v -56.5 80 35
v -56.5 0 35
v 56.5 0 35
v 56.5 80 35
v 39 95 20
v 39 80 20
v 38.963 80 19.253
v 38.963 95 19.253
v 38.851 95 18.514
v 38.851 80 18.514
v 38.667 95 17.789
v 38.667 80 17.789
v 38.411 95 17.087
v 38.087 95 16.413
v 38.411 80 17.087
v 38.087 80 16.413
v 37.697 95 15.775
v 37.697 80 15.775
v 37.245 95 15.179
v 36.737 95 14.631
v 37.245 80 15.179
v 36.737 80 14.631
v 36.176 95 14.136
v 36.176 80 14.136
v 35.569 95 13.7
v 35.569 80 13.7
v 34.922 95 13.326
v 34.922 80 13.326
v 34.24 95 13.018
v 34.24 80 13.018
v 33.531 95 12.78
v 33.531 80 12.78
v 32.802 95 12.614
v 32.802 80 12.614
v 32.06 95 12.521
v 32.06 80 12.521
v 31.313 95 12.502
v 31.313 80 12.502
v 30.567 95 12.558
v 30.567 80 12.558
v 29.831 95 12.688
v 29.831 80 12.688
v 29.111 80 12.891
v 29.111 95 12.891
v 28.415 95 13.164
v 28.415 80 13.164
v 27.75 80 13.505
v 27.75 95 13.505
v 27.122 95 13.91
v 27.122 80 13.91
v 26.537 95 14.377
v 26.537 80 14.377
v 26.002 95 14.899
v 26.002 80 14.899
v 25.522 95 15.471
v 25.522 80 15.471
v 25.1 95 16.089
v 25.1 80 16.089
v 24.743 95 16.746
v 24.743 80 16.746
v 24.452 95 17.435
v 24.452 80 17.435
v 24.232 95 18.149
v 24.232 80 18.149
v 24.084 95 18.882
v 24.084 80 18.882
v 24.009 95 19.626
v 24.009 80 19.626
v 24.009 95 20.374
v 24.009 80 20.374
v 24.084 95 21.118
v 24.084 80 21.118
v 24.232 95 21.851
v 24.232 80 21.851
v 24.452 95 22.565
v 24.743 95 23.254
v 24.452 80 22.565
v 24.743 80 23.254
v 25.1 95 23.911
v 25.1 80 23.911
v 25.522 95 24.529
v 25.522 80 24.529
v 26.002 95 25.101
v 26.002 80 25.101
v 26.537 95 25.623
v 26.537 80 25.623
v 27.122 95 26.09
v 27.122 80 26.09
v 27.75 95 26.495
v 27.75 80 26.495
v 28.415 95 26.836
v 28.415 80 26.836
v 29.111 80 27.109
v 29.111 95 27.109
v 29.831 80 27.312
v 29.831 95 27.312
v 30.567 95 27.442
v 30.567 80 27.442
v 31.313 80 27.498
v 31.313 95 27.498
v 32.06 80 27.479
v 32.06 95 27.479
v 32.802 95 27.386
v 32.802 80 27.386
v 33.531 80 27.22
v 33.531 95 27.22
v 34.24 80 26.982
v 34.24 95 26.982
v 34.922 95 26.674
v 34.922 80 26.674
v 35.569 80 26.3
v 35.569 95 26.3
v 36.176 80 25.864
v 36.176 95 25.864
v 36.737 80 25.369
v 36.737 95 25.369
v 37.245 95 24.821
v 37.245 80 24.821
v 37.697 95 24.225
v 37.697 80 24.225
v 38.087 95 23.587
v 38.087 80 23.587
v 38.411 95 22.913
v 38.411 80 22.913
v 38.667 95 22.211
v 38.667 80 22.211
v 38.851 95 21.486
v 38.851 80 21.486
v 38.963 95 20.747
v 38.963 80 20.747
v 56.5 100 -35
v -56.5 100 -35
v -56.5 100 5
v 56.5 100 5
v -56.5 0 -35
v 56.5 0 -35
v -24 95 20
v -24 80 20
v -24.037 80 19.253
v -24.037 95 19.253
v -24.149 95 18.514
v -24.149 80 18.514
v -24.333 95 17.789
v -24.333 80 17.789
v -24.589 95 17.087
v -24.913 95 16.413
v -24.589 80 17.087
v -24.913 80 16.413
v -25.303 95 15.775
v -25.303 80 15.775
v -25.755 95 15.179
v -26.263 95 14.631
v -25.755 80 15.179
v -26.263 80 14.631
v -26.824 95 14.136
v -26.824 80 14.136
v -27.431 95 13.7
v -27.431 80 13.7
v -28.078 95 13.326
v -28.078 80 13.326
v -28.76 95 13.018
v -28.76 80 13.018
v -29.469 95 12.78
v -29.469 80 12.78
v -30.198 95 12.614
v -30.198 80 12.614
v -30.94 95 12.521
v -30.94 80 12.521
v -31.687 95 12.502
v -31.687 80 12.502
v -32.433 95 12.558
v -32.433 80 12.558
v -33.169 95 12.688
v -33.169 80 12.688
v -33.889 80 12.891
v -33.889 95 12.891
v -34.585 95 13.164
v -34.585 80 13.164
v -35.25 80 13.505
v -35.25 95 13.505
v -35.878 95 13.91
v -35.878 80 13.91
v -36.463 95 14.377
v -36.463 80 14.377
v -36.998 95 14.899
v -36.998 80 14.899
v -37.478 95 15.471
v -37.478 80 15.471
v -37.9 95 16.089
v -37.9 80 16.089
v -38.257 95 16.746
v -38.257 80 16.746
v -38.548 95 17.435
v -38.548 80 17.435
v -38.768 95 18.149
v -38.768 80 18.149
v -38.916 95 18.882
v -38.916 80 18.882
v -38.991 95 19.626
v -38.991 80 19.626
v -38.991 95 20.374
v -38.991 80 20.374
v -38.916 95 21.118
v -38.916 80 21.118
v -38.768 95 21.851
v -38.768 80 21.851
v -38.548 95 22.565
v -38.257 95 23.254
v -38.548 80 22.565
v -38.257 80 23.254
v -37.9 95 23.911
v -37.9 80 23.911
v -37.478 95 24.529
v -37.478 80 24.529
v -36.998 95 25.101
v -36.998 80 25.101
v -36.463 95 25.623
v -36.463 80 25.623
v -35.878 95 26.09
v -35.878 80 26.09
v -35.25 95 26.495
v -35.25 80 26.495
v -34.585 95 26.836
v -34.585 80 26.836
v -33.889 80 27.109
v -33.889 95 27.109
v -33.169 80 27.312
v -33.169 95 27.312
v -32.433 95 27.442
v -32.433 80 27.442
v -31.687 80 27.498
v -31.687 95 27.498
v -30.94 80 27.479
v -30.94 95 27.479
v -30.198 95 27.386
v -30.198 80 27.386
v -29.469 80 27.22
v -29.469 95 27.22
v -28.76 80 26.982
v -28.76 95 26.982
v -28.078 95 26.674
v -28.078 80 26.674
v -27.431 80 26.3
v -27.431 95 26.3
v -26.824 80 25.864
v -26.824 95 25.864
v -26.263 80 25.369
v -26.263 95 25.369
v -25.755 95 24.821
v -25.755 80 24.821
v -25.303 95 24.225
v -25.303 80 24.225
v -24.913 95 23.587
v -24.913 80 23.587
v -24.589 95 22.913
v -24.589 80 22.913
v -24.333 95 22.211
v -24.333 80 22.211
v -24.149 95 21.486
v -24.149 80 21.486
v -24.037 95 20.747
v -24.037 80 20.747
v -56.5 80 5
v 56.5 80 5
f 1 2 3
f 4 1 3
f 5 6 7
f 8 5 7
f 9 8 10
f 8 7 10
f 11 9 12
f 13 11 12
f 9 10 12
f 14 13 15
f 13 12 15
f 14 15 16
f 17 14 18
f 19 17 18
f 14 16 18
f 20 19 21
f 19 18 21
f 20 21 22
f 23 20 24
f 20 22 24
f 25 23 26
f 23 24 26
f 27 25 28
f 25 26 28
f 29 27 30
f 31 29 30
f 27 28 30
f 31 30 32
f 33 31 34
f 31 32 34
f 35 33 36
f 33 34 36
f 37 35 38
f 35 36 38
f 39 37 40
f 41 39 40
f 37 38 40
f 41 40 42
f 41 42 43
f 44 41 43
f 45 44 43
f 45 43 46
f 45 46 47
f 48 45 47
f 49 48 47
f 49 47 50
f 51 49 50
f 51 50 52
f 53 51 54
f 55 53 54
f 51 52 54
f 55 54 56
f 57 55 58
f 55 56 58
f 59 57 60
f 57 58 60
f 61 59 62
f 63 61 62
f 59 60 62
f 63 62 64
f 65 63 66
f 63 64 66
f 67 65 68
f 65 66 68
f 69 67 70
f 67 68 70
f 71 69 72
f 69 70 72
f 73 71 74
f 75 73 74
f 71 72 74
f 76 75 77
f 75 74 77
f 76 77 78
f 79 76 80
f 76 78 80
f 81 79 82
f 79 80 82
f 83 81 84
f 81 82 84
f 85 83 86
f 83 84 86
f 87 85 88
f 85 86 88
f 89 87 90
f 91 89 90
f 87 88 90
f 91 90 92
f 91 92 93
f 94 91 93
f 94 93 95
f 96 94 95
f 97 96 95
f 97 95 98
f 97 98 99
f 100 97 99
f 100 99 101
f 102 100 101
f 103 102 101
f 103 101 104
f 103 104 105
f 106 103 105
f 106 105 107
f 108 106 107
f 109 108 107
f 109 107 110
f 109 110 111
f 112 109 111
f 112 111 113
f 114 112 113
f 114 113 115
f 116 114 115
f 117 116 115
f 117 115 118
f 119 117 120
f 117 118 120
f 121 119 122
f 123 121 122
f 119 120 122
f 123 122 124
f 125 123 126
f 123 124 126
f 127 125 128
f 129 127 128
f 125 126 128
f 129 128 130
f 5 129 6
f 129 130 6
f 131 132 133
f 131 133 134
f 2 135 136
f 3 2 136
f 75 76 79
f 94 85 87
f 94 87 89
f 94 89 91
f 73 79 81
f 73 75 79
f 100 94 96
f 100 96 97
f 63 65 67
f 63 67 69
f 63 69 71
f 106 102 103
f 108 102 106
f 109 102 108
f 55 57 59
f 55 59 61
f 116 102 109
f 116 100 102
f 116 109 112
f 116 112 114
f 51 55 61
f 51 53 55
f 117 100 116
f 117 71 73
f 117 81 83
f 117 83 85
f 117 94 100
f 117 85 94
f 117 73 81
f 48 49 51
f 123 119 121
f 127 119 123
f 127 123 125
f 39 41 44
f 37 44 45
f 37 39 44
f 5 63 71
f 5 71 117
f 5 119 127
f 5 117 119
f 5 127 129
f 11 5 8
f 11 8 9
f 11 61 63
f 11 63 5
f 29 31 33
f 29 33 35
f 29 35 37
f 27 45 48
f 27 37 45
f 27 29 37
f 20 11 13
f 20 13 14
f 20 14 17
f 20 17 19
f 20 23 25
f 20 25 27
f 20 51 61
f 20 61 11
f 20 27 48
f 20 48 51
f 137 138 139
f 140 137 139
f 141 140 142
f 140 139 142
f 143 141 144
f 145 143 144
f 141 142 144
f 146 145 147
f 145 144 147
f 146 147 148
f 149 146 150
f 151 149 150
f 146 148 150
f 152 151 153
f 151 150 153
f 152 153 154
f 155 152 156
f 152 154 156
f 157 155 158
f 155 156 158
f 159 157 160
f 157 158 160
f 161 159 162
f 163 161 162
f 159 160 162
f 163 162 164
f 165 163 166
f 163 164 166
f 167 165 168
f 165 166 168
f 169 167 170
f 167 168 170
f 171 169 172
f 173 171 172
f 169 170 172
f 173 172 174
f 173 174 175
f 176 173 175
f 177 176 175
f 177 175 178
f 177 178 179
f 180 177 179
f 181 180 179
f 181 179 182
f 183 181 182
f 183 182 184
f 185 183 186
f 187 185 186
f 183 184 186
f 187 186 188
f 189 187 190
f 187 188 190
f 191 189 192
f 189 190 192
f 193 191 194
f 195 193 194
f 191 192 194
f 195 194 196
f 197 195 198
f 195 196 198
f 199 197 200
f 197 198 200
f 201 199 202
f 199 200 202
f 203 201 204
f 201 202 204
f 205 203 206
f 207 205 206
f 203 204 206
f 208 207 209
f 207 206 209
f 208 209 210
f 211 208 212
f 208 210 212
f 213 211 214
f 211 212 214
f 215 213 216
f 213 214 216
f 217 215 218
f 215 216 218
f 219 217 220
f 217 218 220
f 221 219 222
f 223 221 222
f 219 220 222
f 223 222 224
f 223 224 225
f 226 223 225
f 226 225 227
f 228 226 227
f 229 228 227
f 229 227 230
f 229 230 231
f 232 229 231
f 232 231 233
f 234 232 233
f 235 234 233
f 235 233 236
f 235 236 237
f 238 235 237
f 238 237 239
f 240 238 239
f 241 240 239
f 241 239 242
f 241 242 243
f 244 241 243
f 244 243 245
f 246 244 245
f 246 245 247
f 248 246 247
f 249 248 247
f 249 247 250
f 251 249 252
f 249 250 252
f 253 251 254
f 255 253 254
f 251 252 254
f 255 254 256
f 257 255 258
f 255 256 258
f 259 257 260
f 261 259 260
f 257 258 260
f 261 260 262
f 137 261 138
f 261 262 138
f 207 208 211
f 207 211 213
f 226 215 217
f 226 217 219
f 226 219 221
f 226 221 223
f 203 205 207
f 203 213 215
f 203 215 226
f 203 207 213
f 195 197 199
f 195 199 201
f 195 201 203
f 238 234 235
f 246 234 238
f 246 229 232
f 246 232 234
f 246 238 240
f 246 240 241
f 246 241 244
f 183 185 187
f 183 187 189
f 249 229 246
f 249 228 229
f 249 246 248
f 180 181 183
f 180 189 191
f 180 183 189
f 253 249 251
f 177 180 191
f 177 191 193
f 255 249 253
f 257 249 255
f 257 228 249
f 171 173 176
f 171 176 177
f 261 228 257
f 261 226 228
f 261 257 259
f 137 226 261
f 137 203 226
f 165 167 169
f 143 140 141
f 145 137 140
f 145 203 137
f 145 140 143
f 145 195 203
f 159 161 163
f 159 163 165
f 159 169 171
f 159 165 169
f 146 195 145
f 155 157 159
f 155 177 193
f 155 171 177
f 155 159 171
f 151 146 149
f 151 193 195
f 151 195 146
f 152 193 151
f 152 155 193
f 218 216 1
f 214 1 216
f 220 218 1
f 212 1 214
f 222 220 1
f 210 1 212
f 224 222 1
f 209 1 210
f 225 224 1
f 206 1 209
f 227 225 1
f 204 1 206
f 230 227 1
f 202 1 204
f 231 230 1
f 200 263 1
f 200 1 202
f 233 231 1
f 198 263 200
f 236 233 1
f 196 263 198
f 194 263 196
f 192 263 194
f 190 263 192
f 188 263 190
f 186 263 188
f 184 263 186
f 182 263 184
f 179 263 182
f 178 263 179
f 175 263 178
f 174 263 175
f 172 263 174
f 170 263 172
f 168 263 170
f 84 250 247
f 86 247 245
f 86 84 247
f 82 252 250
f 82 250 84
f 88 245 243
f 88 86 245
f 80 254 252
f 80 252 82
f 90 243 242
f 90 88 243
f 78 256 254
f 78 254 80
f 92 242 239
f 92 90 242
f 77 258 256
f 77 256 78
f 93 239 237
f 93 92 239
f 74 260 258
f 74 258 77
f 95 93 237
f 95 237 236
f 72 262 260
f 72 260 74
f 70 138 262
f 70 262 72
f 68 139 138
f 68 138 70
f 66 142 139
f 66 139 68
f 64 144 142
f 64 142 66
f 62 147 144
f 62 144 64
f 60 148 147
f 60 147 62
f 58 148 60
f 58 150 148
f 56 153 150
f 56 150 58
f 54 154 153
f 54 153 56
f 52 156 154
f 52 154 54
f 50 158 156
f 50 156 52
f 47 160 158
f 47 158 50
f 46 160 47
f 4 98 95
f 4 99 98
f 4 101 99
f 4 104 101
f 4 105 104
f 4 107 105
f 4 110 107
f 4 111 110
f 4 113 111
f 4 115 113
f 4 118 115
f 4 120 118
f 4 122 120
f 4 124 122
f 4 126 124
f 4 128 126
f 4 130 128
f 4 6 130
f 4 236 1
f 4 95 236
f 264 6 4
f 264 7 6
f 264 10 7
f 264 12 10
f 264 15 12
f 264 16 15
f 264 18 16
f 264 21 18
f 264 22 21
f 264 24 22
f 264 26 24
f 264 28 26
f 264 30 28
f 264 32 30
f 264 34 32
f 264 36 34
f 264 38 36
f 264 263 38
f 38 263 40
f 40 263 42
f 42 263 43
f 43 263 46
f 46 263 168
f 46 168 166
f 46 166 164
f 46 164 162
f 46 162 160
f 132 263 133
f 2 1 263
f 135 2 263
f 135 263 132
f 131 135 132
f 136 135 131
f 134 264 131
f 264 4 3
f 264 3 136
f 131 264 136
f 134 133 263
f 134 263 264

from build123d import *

# Parameters (mm, degrees)
SKETCH1_W           = 113
SKETCH1_H           = 70
BOSS_EXTRUDE1_DEPTH = 100
SKETCH2_W           = 113
SKETCH2_H           = 30
CUT_EXTRUDE2_DEPTH  = 20
SKETCH3_R           = 7.5
BOSS_EXTRUDE2_DEPTH = 15


with BuildPart() as part:
    # Sketch1 → Boss-Extrude1 (new body)
    with BuildSketch(Plane(origin=(0, 0, 0), x_dir=(1, 0, 0), z_dir=(0, 1, 0))):
        Rectangle(SKETCH1_W, SKETCH1_H)
    extrude(amount=BOSS_EXTRUDE1_DEPTH)

    # Sketch2 → Cut-Extrude2 (cut)
    with BuildSketch(Plane(origin=(0, 100, 0), x_dir=(1, 0, 0), z_dir=(0, 1, 0))):
        with Locations((0, -20)):
            Rectangle(SKETCH2_W, SKETCH2_H)
    extrude(amount=-CUT_EXTRUDE2_DEPTH, mode=Mode.SUBTRACT)

    # Sketch3 → Boss-Extrude2 (add)
    with BuildSketch(Plane(origin=(0, 80, 0), x_dir=(1, 0, 0), z_dir=(0, 1, 0))):
        with Locations((-31.5, -20)):
            Circle(SKETCH3_R)
        with Locations((31.5, -20)):
            Circle(SKETCH3_R)
    extrude(amount=BOSS_EXTRUDE2_DEPTH)


solid = part.part
